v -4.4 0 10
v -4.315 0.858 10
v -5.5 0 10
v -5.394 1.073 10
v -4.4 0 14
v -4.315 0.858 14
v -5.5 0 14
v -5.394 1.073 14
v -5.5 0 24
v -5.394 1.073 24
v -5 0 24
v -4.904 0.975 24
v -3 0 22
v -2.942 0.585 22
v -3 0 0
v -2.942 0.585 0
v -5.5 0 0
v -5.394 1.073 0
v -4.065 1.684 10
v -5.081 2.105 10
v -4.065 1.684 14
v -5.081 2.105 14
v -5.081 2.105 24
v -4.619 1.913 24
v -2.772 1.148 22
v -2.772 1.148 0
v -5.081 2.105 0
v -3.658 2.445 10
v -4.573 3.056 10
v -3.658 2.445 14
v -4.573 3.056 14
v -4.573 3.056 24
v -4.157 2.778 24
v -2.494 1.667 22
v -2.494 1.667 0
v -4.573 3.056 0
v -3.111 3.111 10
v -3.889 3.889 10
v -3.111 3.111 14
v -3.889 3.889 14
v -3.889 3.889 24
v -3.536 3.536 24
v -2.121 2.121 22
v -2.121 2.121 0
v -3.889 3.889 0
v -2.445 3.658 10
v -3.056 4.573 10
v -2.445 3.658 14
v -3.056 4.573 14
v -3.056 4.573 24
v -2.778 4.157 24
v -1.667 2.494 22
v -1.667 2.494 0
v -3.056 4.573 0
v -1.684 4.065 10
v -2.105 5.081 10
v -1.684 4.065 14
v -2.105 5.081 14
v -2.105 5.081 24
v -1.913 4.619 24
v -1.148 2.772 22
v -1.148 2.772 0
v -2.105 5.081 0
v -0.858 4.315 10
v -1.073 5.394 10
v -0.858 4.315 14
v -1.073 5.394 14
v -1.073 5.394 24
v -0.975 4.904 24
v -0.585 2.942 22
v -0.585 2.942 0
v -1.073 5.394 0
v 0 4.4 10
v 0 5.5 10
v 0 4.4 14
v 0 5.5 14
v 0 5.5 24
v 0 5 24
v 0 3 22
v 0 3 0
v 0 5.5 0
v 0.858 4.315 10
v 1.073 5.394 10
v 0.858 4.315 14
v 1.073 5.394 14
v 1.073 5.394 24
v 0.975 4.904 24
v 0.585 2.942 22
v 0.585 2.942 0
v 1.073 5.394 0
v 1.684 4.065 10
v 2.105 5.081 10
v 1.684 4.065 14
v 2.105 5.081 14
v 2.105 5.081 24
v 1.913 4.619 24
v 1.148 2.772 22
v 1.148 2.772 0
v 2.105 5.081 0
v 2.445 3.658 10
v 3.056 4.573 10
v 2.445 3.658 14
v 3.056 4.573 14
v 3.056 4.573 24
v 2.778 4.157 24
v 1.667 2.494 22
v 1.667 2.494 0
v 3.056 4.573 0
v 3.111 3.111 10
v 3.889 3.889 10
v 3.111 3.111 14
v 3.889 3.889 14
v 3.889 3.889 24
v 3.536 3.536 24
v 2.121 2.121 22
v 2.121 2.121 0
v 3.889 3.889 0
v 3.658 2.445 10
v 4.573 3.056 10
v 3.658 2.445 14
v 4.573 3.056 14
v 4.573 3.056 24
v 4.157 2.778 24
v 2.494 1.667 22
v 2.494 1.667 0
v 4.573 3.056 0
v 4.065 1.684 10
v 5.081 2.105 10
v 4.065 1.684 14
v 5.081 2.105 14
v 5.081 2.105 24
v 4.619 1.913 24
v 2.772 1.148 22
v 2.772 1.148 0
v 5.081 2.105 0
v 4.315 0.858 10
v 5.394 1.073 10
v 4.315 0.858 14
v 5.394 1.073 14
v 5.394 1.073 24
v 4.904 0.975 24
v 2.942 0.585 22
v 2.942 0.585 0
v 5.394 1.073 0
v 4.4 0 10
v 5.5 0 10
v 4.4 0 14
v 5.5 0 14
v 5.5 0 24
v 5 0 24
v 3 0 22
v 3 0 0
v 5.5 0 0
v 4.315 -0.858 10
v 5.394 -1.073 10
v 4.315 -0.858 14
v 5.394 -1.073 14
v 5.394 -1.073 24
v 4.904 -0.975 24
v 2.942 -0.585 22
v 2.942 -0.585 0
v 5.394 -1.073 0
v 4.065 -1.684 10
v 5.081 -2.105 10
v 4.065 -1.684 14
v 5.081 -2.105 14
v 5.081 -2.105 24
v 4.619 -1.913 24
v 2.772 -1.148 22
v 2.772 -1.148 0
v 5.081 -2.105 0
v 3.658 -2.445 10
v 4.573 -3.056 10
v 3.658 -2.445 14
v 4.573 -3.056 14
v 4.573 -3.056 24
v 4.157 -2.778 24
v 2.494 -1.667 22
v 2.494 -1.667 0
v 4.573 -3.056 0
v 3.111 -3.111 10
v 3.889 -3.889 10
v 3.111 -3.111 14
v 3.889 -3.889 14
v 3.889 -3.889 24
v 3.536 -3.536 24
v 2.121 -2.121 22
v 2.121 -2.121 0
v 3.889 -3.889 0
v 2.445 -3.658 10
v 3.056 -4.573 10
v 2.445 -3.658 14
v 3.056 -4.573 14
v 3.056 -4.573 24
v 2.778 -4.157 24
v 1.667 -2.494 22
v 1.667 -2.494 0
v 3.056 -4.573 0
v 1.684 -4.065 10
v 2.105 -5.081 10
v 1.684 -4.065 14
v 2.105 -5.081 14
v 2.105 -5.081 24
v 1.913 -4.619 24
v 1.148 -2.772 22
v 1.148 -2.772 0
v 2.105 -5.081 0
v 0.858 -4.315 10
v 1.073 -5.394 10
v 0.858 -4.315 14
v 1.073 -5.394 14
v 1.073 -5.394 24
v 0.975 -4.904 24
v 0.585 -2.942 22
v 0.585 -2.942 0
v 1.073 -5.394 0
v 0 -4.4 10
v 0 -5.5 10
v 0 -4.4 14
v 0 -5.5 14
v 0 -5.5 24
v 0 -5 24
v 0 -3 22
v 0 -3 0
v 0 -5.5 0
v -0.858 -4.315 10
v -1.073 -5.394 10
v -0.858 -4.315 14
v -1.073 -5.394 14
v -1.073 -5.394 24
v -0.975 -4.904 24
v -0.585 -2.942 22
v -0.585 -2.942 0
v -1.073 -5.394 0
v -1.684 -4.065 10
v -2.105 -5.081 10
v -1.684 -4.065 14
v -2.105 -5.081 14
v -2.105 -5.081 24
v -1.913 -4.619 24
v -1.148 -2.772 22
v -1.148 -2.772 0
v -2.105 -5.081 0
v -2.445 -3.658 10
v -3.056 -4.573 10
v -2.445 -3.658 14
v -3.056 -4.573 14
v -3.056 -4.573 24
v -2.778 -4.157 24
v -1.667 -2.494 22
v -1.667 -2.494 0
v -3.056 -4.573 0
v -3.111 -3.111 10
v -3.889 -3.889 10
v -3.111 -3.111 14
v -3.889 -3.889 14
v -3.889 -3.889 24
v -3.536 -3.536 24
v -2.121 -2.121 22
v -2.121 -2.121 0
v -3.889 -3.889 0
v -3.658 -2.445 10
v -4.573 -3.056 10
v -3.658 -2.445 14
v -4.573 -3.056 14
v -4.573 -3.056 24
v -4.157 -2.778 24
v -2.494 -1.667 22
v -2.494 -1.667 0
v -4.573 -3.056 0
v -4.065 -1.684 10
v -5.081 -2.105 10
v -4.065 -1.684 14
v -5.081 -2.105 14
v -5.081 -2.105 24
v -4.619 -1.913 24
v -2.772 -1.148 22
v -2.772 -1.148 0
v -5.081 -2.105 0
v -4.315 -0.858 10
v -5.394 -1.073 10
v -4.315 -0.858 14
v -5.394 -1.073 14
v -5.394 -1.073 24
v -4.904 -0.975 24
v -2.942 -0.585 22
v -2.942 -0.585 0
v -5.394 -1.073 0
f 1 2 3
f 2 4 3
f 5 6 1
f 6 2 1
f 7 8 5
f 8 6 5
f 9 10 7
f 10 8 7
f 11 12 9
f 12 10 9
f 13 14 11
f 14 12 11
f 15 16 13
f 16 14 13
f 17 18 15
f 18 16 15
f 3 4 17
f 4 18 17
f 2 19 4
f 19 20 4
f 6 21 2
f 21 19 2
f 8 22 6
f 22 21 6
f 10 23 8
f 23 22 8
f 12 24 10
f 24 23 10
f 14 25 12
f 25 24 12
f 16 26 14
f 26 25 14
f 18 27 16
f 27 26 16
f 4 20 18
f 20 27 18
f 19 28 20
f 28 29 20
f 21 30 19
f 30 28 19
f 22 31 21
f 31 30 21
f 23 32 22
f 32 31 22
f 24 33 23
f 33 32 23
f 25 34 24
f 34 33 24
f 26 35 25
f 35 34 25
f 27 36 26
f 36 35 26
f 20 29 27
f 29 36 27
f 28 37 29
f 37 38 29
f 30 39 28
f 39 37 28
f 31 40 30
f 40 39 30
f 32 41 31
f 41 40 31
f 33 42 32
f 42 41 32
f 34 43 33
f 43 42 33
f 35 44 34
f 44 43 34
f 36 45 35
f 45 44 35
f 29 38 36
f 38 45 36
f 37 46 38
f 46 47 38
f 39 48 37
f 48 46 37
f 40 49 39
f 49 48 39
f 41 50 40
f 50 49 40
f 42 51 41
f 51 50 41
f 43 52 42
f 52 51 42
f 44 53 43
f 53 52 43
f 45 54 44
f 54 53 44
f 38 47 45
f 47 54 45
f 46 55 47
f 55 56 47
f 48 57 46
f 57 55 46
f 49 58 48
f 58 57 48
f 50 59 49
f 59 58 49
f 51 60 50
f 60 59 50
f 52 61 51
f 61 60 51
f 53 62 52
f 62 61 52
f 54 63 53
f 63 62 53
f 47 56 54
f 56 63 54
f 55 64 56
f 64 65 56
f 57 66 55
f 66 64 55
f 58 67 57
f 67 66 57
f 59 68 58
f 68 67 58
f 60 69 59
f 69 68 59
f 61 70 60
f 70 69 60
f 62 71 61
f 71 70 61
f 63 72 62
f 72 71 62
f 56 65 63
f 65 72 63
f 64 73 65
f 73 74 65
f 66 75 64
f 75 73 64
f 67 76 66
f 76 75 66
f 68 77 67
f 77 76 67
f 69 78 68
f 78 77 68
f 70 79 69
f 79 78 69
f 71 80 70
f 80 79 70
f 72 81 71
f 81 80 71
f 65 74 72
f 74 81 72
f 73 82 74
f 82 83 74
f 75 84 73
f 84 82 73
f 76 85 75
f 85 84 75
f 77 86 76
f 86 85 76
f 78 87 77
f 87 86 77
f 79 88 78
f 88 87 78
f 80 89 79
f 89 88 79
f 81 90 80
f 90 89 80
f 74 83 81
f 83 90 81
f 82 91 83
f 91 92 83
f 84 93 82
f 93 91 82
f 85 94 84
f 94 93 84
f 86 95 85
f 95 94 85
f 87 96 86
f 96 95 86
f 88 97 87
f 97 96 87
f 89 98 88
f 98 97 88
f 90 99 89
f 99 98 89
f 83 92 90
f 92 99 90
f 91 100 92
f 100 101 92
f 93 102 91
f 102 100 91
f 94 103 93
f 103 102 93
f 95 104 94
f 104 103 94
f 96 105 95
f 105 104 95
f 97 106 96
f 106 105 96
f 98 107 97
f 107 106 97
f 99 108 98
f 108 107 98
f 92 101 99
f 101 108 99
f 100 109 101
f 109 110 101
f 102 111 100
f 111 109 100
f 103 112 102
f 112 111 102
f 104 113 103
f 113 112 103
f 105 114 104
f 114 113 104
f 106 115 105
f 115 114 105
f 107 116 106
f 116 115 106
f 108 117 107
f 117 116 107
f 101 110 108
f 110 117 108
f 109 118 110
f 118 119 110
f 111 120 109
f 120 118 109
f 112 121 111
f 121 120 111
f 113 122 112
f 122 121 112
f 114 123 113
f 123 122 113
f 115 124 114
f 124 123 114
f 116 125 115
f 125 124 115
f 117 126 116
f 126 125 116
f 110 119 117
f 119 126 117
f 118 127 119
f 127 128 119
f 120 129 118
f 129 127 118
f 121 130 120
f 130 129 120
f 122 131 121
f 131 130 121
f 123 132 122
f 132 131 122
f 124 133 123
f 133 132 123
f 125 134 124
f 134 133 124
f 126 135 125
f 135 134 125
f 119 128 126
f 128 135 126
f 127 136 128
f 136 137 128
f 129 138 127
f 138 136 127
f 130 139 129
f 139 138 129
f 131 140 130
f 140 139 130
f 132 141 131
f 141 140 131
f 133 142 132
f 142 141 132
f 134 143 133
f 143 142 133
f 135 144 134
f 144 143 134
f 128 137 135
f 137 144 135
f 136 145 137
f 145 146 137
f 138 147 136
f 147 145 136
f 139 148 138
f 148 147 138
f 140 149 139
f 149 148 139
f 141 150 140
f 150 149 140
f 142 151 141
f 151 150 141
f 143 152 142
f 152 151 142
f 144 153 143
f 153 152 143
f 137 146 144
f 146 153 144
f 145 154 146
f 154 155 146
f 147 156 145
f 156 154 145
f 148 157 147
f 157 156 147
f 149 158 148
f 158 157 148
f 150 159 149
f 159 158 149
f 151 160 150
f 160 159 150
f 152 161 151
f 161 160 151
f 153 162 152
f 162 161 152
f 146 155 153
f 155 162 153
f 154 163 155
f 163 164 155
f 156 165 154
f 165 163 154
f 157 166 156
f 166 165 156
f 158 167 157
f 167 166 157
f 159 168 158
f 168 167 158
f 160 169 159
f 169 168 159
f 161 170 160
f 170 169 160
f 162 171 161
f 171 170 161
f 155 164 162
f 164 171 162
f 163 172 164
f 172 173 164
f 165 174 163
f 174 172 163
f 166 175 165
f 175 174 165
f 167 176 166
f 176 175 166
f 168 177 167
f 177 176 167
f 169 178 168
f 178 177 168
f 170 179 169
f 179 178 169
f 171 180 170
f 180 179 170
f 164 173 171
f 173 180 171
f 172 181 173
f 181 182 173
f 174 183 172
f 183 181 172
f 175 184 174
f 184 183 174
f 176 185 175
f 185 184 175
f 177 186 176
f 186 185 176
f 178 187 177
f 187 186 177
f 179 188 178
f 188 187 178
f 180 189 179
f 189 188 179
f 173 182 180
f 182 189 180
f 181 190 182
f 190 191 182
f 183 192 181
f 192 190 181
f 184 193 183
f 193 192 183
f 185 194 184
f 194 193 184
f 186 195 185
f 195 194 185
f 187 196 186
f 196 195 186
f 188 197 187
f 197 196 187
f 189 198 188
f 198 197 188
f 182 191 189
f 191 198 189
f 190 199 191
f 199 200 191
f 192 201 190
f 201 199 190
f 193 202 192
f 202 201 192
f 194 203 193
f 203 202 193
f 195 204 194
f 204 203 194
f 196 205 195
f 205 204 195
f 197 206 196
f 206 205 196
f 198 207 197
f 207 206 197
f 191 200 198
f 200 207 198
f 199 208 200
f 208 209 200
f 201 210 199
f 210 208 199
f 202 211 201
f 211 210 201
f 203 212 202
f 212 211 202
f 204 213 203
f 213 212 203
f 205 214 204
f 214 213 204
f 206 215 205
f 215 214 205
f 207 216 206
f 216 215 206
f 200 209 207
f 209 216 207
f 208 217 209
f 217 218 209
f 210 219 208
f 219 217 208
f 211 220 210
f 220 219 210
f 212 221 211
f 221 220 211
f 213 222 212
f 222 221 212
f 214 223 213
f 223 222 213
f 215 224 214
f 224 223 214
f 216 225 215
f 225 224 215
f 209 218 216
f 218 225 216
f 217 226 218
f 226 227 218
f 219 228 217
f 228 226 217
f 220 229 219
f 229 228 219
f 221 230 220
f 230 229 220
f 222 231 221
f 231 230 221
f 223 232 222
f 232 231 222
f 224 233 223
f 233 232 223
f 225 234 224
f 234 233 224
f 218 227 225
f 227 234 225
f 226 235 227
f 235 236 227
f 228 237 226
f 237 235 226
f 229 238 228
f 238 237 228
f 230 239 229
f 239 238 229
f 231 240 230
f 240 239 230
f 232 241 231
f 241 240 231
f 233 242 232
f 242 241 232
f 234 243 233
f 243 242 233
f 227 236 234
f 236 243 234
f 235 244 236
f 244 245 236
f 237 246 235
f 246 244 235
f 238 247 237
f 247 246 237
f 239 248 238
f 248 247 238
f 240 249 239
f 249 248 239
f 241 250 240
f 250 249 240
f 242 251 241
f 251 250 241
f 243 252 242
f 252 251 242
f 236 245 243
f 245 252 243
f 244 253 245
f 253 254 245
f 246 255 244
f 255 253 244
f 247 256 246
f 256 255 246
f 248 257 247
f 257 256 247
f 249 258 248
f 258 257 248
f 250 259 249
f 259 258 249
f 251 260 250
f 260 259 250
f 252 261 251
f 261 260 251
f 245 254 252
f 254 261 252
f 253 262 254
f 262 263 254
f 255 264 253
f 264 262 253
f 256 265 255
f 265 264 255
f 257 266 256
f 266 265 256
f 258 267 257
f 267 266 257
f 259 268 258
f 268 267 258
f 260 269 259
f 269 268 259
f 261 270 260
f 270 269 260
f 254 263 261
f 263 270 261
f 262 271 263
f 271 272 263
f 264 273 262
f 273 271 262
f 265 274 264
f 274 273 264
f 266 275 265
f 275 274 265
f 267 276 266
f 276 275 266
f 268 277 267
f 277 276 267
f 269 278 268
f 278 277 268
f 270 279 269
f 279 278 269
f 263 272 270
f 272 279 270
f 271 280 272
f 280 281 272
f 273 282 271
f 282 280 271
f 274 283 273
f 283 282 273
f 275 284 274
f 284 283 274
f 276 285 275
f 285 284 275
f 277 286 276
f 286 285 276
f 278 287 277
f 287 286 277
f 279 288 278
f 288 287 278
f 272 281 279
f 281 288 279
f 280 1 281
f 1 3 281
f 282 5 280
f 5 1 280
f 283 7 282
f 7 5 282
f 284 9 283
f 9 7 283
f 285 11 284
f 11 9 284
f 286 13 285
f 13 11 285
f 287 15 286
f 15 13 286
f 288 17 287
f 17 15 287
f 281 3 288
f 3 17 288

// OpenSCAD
$fn = 32;

// ----------------------------------------------------------------------
// Grooved revolve: thread_relief, bore R3
// ----------------------------------------------------------------------

// --- parameters (mm) ---
bore_r = 3;               // bore radius
outer_r = 5.5;            // outer radius of the body
total_h = 24;             // overall height, Z
wall = 2.5;               // radial wall thickness
groove_w = 4;             // groove width
groove_d = 1.1;           // groove depth
grooves = 1;              // number of outer grooves
relief = 2;               // thread relief leg at the bore mouth
relief_angle = 45;        // thread relief chamfer angle, degrees

bbox_x = 2 * outer_r;  // full diameter
bore_d = 2 * bore_r;  // bore diameter
body_d = 2 * outer_r;  // body diameter
revolve_angle = 360;  // full turn around the Z axis

profile = [[3, 0], [5.5, 0], [5.5, 10], [4.4, 10], [4.4, 14], [5.5, 14], [5.5, 24], [5, 24], [3, 22]];  // primary outline, 9 points, counter clockwise

// --- the one profile operation ---
rotate_extrude(angle = revolve_angle) polygon(points = profile);
